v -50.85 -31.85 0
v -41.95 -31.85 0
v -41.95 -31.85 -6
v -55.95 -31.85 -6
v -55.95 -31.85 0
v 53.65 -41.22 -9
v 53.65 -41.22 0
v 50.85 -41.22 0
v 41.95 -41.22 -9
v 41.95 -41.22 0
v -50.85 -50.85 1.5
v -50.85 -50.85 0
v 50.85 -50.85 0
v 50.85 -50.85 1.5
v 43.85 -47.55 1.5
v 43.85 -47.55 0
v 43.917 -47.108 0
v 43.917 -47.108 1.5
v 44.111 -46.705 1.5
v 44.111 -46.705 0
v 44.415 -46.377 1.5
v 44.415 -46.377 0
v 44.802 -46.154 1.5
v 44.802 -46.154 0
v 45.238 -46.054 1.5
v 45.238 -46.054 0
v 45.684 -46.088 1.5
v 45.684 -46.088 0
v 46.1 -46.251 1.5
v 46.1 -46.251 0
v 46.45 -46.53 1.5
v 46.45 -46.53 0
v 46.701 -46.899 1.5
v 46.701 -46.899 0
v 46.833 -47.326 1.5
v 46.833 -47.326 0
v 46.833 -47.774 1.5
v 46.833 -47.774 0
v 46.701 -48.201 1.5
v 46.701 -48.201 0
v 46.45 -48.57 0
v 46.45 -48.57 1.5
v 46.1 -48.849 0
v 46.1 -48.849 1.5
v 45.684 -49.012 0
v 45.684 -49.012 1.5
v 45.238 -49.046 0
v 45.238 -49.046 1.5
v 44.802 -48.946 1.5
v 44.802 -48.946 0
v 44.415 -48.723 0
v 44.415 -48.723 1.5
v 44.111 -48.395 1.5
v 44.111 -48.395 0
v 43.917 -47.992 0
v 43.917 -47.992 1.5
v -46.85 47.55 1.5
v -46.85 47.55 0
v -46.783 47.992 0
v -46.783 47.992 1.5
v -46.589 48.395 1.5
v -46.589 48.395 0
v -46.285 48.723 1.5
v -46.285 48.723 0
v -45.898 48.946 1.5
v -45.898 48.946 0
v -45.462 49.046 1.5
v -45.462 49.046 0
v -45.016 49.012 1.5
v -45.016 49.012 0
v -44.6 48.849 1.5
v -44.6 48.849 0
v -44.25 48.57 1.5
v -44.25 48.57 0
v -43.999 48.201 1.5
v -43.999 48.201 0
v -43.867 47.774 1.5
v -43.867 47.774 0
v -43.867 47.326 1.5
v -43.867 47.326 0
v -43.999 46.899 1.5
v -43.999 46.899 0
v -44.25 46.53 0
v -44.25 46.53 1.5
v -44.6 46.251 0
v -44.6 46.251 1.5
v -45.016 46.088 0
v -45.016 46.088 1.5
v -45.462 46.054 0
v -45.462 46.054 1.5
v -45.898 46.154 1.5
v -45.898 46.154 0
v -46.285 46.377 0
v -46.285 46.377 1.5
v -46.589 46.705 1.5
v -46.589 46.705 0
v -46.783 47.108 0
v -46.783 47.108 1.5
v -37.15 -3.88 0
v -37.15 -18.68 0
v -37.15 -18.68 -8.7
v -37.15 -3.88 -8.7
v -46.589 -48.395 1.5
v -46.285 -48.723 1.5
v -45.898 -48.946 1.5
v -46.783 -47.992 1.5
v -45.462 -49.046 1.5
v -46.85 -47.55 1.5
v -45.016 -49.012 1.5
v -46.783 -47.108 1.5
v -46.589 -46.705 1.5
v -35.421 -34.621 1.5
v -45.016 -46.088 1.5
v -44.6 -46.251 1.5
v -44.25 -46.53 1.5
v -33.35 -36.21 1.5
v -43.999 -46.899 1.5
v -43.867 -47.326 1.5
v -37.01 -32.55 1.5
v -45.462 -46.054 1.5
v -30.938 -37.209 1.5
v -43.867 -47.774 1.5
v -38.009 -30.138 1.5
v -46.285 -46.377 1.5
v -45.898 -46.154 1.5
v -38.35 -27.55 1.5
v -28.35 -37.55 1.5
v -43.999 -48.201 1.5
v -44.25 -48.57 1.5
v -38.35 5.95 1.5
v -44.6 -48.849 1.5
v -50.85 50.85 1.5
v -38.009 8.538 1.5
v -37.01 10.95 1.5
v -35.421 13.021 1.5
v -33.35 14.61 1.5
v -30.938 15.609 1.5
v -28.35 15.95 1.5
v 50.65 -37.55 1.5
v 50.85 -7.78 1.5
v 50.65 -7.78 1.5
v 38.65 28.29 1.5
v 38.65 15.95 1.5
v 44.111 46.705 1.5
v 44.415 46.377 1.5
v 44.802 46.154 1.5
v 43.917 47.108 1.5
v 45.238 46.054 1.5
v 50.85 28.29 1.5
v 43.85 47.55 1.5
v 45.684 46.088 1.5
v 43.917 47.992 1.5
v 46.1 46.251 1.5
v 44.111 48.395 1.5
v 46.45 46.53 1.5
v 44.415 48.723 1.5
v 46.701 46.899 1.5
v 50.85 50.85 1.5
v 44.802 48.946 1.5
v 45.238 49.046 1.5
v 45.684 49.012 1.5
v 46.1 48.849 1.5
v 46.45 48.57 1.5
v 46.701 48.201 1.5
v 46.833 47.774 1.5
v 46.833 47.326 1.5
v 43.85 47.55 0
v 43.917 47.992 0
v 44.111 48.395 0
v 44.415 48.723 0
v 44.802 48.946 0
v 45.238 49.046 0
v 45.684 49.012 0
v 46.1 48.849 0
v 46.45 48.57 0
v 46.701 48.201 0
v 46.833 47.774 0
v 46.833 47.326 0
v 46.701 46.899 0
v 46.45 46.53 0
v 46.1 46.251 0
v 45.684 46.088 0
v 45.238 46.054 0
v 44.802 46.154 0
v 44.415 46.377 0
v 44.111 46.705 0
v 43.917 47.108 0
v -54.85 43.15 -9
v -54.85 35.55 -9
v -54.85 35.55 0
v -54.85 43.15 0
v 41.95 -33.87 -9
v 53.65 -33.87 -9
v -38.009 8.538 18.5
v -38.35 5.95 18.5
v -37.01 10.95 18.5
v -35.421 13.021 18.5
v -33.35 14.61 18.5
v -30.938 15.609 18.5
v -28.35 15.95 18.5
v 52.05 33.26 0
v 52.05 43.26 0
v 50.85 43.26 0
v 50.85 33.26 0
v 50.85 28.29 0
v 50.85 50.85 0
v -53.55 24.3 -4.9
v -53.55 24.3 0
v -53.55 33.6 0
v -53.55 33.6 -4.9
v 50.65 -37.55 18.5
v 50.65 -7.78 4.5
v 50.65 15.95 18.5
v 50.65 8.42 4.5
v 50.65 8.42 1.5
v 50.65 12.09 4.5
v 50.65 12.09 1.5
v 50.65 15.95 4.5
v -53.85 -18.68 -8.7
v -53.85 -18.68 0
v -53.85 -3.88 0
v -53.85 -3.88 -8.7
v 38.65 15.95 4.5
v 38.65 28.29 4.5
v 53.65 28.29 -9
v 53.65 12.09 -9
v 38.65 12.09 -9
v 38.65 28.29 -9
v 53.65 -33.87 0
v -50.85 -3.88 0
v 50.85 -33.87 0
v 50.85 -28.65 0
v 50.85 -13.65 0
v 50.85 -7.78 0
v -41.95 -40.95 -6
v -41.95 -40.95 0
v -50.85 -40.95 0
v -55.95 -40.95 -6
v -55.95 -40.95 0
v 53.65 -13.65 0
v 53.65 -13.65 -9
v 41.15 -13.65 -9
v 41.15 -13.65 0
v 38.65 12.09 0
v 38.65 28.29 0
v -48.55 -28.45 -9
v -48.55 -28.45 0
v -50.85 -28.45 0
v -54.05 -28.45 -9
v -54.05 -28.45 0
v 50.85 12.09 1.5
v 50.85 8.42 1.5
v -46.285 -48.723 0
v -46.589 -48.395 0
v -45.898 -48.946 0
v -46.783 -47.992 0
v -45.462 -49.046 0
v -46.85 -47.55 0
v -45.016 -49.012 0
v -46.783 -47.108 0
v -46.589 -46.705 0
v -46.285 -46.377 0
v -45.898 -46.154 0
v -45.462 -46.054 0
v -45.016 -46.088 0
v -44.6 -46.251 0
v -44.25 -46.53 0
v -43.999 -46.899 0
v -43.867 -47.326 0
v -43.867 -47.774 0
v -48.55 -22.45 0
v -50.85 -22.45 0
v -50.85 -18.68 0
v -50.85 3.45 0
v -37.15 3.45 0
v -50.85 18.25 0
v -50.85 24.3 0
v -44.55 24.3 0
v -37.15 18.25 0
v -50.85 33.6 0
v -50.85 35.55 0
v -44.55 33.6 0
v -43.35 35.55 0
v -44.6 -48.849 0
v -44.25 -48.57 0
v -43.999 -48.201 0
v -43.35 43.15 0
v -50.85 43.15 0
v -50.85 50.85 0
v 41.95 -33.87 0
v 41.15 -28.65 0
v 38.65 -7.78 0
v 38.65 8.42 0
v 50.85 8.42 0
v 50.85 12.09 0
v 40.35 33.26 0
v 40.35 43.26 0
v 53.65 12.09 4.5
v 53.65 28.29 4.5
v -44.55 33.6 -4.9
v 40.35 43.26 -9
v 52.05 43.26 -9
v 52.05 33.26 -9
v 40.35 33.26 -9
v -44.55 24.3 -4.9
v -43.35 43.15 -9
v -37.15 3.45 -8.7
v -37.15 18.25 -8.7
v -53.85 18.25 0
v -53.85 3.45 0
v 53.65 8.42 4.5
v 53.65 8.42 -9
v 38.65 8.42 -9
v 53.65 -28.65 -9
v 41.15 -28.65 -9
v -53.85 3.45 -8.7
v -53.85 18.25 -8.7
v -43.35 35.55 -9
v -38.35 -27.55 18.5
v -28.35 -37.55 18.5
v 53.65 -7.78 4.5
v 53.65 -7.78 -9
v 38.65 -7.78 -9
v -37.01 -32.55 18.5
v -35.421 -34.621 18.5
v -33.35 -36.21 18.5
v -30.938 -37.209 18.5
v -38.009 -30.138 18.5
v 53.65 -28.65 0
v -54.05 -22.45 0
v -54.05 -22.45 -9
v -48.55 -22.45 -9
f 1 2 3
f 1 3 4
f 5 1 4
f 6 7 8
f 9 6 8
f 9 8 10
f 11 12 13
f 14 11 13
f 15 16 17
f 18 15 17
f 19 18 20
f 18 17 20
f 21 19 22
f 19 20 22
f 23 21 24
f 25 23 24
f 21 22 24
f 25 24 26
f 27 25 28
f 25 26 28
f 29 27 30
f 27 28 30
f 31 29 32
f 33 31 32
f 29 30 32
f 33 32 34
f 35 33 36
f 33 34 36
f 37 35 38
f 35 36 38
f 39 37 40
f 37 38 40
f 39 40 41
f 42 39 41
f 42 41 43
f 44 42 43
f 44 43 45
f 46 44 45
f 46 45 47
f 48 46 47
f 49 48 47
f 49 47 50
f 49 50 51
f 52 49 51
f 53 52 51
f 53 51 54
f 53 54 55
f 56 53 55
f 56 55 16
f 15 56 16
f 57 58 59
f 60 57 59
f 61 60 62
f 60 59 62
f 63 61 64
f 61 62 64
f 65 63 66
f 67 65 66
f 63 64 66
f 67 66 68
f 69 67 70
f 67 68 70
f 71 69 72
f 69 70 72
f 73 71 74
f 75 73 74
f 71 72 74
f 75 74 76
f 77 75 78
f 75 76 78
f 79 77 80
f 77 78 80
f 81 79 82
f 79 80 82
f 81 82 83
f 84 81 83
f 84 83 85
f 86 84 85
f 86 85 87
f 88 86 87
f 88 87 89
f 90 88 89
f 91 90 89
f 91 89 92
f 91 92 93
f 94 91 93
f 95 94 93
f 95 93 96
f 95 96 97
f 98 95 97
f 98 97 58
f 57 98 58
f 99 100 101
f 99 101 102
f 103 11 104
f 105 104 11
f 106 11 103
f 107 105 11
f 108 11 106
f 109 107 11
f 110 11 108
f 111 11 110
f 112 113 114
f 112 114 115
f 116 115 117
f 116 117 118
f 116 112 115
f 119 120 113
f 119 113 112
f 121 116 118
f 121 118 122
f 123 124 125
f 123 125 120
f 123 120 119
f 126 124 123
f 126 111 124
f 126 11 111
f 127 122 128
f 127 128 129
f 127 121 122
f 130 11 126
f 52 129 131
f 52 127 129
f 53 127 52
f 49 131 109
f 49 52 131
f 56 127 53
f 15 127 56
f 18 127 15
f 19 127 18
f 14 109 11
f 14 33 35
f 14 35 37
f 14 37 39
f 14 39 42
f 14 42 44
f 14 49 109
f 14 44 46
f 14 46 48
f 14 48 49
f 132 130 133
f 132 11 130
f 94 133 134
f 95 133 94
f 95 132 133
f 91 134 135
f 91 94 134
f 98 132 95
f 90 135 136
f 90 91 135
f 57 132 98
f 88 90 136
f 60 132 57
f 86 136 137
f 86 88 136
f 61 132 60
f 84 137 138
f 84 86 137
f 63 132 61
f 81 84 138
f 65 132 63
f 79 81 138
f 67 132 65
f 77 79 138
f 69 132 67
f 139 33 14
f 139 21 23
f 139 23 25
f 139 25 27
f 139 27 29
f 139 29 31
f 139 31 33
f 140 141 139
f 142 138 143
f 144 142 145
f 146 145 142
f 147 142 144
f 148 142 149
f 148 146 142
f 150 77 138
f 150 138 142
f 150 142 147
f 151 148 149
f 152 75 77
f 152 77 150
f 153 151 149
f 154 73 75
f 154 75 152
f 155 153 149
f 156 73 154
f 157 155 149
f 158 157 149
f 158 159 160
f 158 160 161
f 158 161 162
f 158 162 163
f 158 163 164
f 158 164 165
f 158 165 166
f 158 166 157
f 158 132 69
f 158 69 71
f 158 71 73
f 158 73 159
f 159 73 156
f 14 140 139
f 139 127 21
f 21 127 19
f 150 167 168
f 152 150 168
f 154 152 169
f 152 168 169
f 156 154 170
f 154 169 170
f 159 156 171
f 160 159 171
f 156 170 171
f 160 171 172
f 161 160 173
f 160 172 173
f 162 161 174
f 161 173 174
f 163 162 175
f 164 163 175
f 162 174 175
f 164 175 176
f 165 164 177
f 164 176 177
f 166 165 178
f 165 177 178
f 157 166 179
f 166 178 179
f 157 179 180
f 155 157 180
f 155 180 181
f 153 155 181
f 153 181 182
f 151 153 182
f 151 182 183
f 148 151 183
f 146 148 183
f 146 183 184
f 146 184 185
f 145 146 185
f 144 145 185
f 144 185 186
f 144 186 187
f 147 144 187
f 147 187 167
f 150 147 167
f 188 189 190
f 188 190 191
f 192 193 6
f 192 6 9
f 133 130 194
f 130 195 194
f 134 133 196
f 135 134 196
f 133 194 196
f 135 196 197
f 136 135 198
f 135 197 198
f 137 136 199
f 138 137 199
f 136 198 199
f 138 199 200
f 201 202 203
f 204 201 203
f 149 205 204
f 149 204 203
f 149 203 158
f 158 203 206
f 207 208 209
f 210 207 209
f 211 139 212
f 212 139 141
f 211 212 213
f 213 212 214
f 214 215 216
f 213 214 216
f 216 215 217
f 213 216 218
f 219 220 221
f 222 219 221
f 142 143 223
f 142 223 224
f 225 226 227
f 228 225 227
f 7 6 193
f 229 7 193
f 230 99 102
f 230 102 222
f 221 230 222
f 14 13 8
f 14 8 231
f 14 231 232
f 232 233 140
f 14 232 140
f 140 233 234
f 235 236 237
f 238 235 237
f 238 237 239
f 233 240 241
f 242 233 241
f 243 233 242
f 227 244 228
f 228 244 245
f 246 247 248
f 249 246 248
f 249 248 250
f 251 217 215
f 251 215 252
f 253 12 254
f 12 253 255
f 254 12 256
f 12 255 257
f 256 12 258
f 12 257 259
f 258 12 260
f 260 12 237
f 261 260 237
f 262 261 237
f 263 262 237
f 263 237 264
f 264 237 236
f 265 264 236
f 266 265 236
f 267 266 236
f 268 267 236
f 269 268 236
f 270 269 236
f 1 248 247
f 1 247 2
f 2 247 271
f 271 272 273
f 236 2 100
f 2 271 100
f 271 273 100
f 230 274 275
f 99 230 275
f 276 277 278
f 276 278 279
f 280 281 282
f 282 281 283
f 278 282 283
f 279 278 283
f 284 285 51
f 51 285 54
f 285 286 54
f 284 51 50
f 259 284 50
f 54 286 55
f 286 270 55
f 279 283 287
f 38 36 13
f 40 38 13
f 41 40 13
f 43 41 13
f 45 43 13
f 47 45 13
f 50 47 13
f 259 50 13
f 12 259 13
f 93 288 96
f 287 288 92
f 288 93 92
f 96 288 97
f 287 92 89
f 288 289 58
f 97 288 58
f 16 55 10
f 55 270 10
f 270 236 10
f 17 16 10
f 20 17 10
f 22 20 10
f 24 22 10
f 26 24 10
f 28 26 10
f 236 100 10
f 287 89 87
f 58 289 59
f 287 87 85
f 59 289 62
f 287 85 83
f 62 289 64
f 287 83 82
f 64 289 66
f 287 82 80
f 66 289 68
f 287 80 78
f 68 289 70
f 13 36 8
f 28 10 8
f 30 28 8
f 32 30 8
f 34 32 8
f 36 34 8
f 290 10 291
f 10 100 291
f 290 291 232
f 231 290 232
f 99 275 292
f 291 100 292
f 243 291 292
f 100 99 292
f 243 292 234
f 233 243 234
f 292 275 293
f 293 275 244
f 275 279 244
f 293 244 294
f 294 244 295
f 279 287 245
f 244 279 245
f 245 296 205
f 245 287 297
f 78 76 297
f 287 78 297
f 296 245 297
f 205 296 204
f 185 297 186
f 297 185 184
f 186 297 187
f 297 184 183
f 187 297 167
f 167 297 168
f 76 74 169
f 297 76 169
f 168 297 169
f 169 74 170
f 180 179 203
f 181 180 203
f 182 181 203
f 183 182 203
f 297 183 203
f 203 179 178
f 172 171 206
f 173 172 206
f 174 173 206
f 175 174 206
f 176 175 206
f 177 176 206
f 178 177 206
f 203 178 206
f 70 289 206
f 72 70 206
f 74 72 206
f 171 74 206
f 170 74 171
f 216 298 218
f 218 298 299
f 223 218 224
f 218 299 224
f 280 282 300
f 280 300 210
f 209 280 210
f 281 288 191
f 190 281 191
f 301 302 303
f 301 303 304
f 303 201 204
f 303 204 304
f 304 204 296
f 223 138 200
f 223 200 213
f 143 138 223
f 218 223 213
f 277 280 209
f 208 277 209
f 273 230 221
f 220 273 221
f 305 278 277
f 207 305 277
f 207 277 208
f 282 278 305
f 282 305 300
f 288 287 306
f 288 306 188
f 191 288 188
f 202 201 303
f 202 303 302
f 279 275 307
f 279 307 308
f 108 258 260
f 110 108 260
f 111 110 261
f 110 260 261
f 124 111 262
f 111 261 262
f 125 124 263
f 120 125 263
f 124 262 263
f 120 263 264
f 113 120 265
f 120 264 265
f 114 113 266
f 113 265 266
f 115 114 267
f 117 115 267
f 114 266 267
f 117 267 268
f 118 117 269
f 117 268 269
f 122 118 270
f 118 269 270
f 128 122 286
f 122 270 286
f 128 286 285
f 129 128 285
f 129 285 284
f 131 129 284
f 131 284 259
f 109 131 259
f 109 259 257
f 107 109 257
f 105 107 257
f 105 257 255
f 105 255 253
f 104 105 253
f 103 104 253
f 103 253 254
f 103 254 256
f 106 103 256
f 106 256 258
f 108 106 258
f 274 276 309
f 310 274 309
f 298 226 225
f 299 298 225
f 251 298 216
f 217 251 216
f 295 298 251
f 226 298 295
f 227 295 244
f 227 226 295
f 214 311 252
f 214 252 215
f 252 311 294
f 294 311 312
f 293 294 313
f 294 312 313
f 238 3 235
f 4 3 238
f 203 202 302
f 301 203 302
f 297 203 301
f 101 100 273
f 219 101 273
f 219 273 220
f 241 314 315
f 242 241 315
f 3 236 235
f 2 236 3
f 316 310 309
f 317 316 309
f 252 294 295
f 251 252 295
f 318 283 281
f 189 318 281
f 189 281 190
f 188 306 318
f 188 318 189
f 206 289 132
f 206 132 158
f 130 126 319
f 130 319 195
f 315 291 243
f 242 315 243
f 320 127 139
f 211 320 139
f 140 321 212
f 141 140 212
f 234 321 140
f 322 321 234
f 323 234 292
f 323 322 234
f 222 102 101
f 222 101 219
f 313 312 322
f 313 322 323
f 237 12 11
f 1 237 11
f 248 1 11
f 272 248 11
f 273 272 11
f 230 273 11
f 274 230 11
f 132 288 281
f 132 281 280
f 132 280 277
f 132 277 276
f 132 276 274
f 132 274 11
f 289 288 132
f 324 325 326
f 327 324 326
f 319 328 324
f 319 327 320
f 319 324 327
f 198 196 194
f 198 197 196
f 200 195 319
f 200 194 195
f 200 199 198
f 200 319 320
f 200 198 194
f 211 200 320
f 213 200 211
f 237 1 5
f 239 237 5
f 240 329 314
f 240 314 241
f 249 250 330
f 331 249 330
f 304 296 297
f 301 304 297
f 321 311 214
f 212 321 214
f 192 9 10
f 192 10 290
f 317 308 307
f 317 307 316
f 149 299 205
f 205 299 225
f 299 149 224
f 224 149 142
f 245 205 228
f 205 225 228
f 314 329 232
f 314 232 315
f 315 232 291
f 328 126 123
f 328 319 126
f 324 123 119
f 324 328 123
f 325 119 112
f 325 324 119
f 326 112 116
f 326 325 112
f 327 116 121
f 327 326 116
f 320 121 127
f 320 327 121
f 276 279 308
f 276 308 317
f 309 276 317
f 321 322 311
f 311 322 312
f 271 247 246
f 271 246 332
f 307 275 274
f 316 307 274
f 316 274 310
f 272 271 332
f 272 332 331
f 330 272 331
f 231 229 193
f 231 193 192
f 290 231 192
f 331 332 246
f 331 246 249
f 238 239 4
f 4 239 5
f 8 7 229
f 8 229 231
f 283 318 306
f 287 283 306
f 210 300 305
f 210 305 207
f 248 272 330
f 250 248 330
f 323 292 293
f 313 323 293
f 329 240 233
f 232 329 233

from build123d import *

# Parameters (mm, degrees)
SKETCH_1_W          = 101.7
SKETCH_1_H          = 101.7
EXTRUDE_1_DEPTH     = 1.5
SKETCH_2_R          = 1.5
CUT_EXTRUDE_1_DEPTH = 2.5
SKETCH_3_W          = 11.5
SKETCH_3_H          = 7.6
SKETCH_3_W_2        = 9
SKETCH_3_H_2        = 9.3
SKETCH_3_W_3        = 16.7
SKETCH_3_H_3        = 14.8
SKETCH_3_W_4        = 5.5
SKETCH_3_H_4        = 6
SKETCH_3_W_5        = 14
SKETCH_3_H_5        = 9.1
SKETCH_3_W_6        = 11.7
SKETCH_3_H_6        = 10
SKETCH_3_W_7        = 15
SKETCH_3_H_7        = 16.2
SKETCH_3_W_8        = 12.5
SKETCH_3_H_8        = 15
SKETCH_3_H_9        = 7.35
EXTRUDE_2_DEPTH     = 9
SKETCH_4_W          = 9
SKETCH_4_H          = 9.3
CUT_EXTRUDE_2_DEPTH = 4.1
SKETCH_5_W          = 16.7
SKETCH_5_H          = 14.8
CUT_EXTRUDE_3_DEPTH = 0.3
SKETCH_7_W          = 14
SKETCH_7_H          = 9.1
CUT_EXTRUDE_4_DEPTH = 3
SKETCH_8_W          = 15
SKETCH_8_H          = 16.2
EXTRUDE_4_DEPTH     = 13.5
SKETCH_9_W          = 89
SKETCH_9_H          = 53.5
EXTRUDE_5_DEPTH     = 17
FILLET_1_R          = 10


with BuildPart() as part:
    # 草图1 → 凸台-拉伸1 (new body)
    with BuildSketch(Plane.XY):
        Rectangle(SKETCH_1_W, SKETCH_1_H)
    extrude(amount=EXTRUDE_1_DEPTH)

    # 草图2 → 切除-拉伸1 (cut, through all)
    with BuildSketch(Plane(origin=(0, 0, 0), x_dir=(-1, 0, 0), z_dir=(0, 0, -1))):
        with Locations((-45.35, -47.55)):
            Circle(SKETCH_2_R)
        with Locations((45.35, -47.55)):
            Circle(SKETCH_2_R)
        with Locations((45.35, 47.55)):
            Circle(SKETCH_2_R)
        with Locations((-45.35, 47.55)):
            Circle(SKETCH_2_R)
    extrude(amount=-CUT_EXTRUDE_1_DEPTH, mode=Mode.SUBTRACT)

    # 草图3 → 凸台-拉伸2 (add)
    with BuildSketch(Plane(origin=(0, 0, 0), x_dir=(-1, 0, 0), z_dir=(0, 0, -1))):
        with Locations((49.1, 39.35)):
            Rectangle(SKETCH_3_W, SKETCH_3_H)
        with Locations((49.05, 28.95)):
            Rectangle(SKETCH_3_W_2, SKETCH_3_H_2)
        with Locations((45.5, 10.85)):
            Rectangle(SKETCH_3_W_3, SKETCH_3_H_3)
        with Locations((45.5, -11.28)):
            Rectangle(SKETCH_3_W_3, SKETCH_3_H_3)
        with Locations((51.3, -25.45)):
            Rectangle(SKETCH_3_W_4, SKETCH_3_H_4)
        with Locations((48.95, -36.4)):
            Rectangle(SKETCH_3_W_5, SKETCH_3_H_5)
        with Locations((-46.2, 38.26)):
            Rectangle(SKETCH_3_W_6, SKETCH_3_H_6)
        with Locations((-46.15, 20.19)):
            Rectangle(SKETCH_3_W_7, SKETCH_3_H_7)
        with Locations((-46.15, 0.32)):
            Rectangle(SKETCH_3_W_7, SKETCH_3_H_7)
        with Locations((-47.4, -21.15)):
            Rectangle(SKETCH_3_W_8, SKETCH_3_H_8)
        with Locations((-47.8, -37.545)):
            Rectangle(SKETCH_3_W_6, SKETCH_3_H_9)
    extrude(amount=EXTRUDE_2_DEPTH)

    # 草图4 → 切除-拉伸2 (cut)
    with BuildSketch(Plane(origin=(0, 0, -9), x_dir=(-1, 0, 0), z_dir=(0, 0, -1))):
        with Locations((49.05, 28.95)):
            Rectangle(SKETCH_4_W, SKETCH_4_H)
    extrude(amount=-CUT_EXTRUDE_2_DEPTH, mode=Mode.SUBTRACT)

    # 草图5 → 切除-拉伸3 (cut)
    with BuildSketch(Plane(origin=(0, 0, -9), x_dir=(-1, 0, 0), z_dir=(0, 0, -1))):
        with Locations((45.5, 10.85)):
            Rectangle(SKETCH_5_W, SKETCH_5_H)
        with Locations((45.5, -11.28)):
            Rectangle(SKETCH_5_W, SKETCH_5_H)
    extrude(amount=-CUT_EXTRUDE_3_DEPTH, mode=Mode.SUBTRACT)

    # 草图7 → 切除-拉伸4 (cut)
    with BuildSketch(Plane(origin=(0, 0, -9), x_dir=(-1, 0, 0), z_dir=(0, 0, -1))):
        with Locations((48.95, -36.4)):
            Rectangle(SKETCH_7_W, SKETCH_7_H)
    extrude(amount=-CUT_EXTRUDE_4_DEPTH, mode=Mode.SUBTRACT)

    # 草图8 → 凸台-拉伸4 (add)
    with BuildSketch(Plane(origin=(0, 0, -9), x_dir=(-1, 0, 0), z_dir=(0, 0, -1))):
        with Locations((-46.15, 0.32)):
            Rectangle(SKETCH_8_W, SKETCH_8_H)
        with Locations((-46.15, 20.19)):
            Rectangle(SKETCH_8_W, SKETCH_8_H)
    extrude(amount=-EXTRUDE_4_DEPTH)

    # 草图9 → 凸台-拉伸5 (add)
    with BuildSketch(Plane.XY.offset(1.5)):
        with Locations((6.15, -10.8)):
            Rectangle(SKETCH_9_W, SKETCH_9_H)
    extrude(amount=EXTRUDE_5_DEPTH)

    # 圆角1
    fillet_1_edges = [part.edges().sort_by_distance(p)[0] for p in [
        (-38.35, 15.95, 10),
        (-38.35, -37.55, 10),
    ]]
    fillet(fillet_1_edges, radius=FILLET_1_R)


solid = part.part
